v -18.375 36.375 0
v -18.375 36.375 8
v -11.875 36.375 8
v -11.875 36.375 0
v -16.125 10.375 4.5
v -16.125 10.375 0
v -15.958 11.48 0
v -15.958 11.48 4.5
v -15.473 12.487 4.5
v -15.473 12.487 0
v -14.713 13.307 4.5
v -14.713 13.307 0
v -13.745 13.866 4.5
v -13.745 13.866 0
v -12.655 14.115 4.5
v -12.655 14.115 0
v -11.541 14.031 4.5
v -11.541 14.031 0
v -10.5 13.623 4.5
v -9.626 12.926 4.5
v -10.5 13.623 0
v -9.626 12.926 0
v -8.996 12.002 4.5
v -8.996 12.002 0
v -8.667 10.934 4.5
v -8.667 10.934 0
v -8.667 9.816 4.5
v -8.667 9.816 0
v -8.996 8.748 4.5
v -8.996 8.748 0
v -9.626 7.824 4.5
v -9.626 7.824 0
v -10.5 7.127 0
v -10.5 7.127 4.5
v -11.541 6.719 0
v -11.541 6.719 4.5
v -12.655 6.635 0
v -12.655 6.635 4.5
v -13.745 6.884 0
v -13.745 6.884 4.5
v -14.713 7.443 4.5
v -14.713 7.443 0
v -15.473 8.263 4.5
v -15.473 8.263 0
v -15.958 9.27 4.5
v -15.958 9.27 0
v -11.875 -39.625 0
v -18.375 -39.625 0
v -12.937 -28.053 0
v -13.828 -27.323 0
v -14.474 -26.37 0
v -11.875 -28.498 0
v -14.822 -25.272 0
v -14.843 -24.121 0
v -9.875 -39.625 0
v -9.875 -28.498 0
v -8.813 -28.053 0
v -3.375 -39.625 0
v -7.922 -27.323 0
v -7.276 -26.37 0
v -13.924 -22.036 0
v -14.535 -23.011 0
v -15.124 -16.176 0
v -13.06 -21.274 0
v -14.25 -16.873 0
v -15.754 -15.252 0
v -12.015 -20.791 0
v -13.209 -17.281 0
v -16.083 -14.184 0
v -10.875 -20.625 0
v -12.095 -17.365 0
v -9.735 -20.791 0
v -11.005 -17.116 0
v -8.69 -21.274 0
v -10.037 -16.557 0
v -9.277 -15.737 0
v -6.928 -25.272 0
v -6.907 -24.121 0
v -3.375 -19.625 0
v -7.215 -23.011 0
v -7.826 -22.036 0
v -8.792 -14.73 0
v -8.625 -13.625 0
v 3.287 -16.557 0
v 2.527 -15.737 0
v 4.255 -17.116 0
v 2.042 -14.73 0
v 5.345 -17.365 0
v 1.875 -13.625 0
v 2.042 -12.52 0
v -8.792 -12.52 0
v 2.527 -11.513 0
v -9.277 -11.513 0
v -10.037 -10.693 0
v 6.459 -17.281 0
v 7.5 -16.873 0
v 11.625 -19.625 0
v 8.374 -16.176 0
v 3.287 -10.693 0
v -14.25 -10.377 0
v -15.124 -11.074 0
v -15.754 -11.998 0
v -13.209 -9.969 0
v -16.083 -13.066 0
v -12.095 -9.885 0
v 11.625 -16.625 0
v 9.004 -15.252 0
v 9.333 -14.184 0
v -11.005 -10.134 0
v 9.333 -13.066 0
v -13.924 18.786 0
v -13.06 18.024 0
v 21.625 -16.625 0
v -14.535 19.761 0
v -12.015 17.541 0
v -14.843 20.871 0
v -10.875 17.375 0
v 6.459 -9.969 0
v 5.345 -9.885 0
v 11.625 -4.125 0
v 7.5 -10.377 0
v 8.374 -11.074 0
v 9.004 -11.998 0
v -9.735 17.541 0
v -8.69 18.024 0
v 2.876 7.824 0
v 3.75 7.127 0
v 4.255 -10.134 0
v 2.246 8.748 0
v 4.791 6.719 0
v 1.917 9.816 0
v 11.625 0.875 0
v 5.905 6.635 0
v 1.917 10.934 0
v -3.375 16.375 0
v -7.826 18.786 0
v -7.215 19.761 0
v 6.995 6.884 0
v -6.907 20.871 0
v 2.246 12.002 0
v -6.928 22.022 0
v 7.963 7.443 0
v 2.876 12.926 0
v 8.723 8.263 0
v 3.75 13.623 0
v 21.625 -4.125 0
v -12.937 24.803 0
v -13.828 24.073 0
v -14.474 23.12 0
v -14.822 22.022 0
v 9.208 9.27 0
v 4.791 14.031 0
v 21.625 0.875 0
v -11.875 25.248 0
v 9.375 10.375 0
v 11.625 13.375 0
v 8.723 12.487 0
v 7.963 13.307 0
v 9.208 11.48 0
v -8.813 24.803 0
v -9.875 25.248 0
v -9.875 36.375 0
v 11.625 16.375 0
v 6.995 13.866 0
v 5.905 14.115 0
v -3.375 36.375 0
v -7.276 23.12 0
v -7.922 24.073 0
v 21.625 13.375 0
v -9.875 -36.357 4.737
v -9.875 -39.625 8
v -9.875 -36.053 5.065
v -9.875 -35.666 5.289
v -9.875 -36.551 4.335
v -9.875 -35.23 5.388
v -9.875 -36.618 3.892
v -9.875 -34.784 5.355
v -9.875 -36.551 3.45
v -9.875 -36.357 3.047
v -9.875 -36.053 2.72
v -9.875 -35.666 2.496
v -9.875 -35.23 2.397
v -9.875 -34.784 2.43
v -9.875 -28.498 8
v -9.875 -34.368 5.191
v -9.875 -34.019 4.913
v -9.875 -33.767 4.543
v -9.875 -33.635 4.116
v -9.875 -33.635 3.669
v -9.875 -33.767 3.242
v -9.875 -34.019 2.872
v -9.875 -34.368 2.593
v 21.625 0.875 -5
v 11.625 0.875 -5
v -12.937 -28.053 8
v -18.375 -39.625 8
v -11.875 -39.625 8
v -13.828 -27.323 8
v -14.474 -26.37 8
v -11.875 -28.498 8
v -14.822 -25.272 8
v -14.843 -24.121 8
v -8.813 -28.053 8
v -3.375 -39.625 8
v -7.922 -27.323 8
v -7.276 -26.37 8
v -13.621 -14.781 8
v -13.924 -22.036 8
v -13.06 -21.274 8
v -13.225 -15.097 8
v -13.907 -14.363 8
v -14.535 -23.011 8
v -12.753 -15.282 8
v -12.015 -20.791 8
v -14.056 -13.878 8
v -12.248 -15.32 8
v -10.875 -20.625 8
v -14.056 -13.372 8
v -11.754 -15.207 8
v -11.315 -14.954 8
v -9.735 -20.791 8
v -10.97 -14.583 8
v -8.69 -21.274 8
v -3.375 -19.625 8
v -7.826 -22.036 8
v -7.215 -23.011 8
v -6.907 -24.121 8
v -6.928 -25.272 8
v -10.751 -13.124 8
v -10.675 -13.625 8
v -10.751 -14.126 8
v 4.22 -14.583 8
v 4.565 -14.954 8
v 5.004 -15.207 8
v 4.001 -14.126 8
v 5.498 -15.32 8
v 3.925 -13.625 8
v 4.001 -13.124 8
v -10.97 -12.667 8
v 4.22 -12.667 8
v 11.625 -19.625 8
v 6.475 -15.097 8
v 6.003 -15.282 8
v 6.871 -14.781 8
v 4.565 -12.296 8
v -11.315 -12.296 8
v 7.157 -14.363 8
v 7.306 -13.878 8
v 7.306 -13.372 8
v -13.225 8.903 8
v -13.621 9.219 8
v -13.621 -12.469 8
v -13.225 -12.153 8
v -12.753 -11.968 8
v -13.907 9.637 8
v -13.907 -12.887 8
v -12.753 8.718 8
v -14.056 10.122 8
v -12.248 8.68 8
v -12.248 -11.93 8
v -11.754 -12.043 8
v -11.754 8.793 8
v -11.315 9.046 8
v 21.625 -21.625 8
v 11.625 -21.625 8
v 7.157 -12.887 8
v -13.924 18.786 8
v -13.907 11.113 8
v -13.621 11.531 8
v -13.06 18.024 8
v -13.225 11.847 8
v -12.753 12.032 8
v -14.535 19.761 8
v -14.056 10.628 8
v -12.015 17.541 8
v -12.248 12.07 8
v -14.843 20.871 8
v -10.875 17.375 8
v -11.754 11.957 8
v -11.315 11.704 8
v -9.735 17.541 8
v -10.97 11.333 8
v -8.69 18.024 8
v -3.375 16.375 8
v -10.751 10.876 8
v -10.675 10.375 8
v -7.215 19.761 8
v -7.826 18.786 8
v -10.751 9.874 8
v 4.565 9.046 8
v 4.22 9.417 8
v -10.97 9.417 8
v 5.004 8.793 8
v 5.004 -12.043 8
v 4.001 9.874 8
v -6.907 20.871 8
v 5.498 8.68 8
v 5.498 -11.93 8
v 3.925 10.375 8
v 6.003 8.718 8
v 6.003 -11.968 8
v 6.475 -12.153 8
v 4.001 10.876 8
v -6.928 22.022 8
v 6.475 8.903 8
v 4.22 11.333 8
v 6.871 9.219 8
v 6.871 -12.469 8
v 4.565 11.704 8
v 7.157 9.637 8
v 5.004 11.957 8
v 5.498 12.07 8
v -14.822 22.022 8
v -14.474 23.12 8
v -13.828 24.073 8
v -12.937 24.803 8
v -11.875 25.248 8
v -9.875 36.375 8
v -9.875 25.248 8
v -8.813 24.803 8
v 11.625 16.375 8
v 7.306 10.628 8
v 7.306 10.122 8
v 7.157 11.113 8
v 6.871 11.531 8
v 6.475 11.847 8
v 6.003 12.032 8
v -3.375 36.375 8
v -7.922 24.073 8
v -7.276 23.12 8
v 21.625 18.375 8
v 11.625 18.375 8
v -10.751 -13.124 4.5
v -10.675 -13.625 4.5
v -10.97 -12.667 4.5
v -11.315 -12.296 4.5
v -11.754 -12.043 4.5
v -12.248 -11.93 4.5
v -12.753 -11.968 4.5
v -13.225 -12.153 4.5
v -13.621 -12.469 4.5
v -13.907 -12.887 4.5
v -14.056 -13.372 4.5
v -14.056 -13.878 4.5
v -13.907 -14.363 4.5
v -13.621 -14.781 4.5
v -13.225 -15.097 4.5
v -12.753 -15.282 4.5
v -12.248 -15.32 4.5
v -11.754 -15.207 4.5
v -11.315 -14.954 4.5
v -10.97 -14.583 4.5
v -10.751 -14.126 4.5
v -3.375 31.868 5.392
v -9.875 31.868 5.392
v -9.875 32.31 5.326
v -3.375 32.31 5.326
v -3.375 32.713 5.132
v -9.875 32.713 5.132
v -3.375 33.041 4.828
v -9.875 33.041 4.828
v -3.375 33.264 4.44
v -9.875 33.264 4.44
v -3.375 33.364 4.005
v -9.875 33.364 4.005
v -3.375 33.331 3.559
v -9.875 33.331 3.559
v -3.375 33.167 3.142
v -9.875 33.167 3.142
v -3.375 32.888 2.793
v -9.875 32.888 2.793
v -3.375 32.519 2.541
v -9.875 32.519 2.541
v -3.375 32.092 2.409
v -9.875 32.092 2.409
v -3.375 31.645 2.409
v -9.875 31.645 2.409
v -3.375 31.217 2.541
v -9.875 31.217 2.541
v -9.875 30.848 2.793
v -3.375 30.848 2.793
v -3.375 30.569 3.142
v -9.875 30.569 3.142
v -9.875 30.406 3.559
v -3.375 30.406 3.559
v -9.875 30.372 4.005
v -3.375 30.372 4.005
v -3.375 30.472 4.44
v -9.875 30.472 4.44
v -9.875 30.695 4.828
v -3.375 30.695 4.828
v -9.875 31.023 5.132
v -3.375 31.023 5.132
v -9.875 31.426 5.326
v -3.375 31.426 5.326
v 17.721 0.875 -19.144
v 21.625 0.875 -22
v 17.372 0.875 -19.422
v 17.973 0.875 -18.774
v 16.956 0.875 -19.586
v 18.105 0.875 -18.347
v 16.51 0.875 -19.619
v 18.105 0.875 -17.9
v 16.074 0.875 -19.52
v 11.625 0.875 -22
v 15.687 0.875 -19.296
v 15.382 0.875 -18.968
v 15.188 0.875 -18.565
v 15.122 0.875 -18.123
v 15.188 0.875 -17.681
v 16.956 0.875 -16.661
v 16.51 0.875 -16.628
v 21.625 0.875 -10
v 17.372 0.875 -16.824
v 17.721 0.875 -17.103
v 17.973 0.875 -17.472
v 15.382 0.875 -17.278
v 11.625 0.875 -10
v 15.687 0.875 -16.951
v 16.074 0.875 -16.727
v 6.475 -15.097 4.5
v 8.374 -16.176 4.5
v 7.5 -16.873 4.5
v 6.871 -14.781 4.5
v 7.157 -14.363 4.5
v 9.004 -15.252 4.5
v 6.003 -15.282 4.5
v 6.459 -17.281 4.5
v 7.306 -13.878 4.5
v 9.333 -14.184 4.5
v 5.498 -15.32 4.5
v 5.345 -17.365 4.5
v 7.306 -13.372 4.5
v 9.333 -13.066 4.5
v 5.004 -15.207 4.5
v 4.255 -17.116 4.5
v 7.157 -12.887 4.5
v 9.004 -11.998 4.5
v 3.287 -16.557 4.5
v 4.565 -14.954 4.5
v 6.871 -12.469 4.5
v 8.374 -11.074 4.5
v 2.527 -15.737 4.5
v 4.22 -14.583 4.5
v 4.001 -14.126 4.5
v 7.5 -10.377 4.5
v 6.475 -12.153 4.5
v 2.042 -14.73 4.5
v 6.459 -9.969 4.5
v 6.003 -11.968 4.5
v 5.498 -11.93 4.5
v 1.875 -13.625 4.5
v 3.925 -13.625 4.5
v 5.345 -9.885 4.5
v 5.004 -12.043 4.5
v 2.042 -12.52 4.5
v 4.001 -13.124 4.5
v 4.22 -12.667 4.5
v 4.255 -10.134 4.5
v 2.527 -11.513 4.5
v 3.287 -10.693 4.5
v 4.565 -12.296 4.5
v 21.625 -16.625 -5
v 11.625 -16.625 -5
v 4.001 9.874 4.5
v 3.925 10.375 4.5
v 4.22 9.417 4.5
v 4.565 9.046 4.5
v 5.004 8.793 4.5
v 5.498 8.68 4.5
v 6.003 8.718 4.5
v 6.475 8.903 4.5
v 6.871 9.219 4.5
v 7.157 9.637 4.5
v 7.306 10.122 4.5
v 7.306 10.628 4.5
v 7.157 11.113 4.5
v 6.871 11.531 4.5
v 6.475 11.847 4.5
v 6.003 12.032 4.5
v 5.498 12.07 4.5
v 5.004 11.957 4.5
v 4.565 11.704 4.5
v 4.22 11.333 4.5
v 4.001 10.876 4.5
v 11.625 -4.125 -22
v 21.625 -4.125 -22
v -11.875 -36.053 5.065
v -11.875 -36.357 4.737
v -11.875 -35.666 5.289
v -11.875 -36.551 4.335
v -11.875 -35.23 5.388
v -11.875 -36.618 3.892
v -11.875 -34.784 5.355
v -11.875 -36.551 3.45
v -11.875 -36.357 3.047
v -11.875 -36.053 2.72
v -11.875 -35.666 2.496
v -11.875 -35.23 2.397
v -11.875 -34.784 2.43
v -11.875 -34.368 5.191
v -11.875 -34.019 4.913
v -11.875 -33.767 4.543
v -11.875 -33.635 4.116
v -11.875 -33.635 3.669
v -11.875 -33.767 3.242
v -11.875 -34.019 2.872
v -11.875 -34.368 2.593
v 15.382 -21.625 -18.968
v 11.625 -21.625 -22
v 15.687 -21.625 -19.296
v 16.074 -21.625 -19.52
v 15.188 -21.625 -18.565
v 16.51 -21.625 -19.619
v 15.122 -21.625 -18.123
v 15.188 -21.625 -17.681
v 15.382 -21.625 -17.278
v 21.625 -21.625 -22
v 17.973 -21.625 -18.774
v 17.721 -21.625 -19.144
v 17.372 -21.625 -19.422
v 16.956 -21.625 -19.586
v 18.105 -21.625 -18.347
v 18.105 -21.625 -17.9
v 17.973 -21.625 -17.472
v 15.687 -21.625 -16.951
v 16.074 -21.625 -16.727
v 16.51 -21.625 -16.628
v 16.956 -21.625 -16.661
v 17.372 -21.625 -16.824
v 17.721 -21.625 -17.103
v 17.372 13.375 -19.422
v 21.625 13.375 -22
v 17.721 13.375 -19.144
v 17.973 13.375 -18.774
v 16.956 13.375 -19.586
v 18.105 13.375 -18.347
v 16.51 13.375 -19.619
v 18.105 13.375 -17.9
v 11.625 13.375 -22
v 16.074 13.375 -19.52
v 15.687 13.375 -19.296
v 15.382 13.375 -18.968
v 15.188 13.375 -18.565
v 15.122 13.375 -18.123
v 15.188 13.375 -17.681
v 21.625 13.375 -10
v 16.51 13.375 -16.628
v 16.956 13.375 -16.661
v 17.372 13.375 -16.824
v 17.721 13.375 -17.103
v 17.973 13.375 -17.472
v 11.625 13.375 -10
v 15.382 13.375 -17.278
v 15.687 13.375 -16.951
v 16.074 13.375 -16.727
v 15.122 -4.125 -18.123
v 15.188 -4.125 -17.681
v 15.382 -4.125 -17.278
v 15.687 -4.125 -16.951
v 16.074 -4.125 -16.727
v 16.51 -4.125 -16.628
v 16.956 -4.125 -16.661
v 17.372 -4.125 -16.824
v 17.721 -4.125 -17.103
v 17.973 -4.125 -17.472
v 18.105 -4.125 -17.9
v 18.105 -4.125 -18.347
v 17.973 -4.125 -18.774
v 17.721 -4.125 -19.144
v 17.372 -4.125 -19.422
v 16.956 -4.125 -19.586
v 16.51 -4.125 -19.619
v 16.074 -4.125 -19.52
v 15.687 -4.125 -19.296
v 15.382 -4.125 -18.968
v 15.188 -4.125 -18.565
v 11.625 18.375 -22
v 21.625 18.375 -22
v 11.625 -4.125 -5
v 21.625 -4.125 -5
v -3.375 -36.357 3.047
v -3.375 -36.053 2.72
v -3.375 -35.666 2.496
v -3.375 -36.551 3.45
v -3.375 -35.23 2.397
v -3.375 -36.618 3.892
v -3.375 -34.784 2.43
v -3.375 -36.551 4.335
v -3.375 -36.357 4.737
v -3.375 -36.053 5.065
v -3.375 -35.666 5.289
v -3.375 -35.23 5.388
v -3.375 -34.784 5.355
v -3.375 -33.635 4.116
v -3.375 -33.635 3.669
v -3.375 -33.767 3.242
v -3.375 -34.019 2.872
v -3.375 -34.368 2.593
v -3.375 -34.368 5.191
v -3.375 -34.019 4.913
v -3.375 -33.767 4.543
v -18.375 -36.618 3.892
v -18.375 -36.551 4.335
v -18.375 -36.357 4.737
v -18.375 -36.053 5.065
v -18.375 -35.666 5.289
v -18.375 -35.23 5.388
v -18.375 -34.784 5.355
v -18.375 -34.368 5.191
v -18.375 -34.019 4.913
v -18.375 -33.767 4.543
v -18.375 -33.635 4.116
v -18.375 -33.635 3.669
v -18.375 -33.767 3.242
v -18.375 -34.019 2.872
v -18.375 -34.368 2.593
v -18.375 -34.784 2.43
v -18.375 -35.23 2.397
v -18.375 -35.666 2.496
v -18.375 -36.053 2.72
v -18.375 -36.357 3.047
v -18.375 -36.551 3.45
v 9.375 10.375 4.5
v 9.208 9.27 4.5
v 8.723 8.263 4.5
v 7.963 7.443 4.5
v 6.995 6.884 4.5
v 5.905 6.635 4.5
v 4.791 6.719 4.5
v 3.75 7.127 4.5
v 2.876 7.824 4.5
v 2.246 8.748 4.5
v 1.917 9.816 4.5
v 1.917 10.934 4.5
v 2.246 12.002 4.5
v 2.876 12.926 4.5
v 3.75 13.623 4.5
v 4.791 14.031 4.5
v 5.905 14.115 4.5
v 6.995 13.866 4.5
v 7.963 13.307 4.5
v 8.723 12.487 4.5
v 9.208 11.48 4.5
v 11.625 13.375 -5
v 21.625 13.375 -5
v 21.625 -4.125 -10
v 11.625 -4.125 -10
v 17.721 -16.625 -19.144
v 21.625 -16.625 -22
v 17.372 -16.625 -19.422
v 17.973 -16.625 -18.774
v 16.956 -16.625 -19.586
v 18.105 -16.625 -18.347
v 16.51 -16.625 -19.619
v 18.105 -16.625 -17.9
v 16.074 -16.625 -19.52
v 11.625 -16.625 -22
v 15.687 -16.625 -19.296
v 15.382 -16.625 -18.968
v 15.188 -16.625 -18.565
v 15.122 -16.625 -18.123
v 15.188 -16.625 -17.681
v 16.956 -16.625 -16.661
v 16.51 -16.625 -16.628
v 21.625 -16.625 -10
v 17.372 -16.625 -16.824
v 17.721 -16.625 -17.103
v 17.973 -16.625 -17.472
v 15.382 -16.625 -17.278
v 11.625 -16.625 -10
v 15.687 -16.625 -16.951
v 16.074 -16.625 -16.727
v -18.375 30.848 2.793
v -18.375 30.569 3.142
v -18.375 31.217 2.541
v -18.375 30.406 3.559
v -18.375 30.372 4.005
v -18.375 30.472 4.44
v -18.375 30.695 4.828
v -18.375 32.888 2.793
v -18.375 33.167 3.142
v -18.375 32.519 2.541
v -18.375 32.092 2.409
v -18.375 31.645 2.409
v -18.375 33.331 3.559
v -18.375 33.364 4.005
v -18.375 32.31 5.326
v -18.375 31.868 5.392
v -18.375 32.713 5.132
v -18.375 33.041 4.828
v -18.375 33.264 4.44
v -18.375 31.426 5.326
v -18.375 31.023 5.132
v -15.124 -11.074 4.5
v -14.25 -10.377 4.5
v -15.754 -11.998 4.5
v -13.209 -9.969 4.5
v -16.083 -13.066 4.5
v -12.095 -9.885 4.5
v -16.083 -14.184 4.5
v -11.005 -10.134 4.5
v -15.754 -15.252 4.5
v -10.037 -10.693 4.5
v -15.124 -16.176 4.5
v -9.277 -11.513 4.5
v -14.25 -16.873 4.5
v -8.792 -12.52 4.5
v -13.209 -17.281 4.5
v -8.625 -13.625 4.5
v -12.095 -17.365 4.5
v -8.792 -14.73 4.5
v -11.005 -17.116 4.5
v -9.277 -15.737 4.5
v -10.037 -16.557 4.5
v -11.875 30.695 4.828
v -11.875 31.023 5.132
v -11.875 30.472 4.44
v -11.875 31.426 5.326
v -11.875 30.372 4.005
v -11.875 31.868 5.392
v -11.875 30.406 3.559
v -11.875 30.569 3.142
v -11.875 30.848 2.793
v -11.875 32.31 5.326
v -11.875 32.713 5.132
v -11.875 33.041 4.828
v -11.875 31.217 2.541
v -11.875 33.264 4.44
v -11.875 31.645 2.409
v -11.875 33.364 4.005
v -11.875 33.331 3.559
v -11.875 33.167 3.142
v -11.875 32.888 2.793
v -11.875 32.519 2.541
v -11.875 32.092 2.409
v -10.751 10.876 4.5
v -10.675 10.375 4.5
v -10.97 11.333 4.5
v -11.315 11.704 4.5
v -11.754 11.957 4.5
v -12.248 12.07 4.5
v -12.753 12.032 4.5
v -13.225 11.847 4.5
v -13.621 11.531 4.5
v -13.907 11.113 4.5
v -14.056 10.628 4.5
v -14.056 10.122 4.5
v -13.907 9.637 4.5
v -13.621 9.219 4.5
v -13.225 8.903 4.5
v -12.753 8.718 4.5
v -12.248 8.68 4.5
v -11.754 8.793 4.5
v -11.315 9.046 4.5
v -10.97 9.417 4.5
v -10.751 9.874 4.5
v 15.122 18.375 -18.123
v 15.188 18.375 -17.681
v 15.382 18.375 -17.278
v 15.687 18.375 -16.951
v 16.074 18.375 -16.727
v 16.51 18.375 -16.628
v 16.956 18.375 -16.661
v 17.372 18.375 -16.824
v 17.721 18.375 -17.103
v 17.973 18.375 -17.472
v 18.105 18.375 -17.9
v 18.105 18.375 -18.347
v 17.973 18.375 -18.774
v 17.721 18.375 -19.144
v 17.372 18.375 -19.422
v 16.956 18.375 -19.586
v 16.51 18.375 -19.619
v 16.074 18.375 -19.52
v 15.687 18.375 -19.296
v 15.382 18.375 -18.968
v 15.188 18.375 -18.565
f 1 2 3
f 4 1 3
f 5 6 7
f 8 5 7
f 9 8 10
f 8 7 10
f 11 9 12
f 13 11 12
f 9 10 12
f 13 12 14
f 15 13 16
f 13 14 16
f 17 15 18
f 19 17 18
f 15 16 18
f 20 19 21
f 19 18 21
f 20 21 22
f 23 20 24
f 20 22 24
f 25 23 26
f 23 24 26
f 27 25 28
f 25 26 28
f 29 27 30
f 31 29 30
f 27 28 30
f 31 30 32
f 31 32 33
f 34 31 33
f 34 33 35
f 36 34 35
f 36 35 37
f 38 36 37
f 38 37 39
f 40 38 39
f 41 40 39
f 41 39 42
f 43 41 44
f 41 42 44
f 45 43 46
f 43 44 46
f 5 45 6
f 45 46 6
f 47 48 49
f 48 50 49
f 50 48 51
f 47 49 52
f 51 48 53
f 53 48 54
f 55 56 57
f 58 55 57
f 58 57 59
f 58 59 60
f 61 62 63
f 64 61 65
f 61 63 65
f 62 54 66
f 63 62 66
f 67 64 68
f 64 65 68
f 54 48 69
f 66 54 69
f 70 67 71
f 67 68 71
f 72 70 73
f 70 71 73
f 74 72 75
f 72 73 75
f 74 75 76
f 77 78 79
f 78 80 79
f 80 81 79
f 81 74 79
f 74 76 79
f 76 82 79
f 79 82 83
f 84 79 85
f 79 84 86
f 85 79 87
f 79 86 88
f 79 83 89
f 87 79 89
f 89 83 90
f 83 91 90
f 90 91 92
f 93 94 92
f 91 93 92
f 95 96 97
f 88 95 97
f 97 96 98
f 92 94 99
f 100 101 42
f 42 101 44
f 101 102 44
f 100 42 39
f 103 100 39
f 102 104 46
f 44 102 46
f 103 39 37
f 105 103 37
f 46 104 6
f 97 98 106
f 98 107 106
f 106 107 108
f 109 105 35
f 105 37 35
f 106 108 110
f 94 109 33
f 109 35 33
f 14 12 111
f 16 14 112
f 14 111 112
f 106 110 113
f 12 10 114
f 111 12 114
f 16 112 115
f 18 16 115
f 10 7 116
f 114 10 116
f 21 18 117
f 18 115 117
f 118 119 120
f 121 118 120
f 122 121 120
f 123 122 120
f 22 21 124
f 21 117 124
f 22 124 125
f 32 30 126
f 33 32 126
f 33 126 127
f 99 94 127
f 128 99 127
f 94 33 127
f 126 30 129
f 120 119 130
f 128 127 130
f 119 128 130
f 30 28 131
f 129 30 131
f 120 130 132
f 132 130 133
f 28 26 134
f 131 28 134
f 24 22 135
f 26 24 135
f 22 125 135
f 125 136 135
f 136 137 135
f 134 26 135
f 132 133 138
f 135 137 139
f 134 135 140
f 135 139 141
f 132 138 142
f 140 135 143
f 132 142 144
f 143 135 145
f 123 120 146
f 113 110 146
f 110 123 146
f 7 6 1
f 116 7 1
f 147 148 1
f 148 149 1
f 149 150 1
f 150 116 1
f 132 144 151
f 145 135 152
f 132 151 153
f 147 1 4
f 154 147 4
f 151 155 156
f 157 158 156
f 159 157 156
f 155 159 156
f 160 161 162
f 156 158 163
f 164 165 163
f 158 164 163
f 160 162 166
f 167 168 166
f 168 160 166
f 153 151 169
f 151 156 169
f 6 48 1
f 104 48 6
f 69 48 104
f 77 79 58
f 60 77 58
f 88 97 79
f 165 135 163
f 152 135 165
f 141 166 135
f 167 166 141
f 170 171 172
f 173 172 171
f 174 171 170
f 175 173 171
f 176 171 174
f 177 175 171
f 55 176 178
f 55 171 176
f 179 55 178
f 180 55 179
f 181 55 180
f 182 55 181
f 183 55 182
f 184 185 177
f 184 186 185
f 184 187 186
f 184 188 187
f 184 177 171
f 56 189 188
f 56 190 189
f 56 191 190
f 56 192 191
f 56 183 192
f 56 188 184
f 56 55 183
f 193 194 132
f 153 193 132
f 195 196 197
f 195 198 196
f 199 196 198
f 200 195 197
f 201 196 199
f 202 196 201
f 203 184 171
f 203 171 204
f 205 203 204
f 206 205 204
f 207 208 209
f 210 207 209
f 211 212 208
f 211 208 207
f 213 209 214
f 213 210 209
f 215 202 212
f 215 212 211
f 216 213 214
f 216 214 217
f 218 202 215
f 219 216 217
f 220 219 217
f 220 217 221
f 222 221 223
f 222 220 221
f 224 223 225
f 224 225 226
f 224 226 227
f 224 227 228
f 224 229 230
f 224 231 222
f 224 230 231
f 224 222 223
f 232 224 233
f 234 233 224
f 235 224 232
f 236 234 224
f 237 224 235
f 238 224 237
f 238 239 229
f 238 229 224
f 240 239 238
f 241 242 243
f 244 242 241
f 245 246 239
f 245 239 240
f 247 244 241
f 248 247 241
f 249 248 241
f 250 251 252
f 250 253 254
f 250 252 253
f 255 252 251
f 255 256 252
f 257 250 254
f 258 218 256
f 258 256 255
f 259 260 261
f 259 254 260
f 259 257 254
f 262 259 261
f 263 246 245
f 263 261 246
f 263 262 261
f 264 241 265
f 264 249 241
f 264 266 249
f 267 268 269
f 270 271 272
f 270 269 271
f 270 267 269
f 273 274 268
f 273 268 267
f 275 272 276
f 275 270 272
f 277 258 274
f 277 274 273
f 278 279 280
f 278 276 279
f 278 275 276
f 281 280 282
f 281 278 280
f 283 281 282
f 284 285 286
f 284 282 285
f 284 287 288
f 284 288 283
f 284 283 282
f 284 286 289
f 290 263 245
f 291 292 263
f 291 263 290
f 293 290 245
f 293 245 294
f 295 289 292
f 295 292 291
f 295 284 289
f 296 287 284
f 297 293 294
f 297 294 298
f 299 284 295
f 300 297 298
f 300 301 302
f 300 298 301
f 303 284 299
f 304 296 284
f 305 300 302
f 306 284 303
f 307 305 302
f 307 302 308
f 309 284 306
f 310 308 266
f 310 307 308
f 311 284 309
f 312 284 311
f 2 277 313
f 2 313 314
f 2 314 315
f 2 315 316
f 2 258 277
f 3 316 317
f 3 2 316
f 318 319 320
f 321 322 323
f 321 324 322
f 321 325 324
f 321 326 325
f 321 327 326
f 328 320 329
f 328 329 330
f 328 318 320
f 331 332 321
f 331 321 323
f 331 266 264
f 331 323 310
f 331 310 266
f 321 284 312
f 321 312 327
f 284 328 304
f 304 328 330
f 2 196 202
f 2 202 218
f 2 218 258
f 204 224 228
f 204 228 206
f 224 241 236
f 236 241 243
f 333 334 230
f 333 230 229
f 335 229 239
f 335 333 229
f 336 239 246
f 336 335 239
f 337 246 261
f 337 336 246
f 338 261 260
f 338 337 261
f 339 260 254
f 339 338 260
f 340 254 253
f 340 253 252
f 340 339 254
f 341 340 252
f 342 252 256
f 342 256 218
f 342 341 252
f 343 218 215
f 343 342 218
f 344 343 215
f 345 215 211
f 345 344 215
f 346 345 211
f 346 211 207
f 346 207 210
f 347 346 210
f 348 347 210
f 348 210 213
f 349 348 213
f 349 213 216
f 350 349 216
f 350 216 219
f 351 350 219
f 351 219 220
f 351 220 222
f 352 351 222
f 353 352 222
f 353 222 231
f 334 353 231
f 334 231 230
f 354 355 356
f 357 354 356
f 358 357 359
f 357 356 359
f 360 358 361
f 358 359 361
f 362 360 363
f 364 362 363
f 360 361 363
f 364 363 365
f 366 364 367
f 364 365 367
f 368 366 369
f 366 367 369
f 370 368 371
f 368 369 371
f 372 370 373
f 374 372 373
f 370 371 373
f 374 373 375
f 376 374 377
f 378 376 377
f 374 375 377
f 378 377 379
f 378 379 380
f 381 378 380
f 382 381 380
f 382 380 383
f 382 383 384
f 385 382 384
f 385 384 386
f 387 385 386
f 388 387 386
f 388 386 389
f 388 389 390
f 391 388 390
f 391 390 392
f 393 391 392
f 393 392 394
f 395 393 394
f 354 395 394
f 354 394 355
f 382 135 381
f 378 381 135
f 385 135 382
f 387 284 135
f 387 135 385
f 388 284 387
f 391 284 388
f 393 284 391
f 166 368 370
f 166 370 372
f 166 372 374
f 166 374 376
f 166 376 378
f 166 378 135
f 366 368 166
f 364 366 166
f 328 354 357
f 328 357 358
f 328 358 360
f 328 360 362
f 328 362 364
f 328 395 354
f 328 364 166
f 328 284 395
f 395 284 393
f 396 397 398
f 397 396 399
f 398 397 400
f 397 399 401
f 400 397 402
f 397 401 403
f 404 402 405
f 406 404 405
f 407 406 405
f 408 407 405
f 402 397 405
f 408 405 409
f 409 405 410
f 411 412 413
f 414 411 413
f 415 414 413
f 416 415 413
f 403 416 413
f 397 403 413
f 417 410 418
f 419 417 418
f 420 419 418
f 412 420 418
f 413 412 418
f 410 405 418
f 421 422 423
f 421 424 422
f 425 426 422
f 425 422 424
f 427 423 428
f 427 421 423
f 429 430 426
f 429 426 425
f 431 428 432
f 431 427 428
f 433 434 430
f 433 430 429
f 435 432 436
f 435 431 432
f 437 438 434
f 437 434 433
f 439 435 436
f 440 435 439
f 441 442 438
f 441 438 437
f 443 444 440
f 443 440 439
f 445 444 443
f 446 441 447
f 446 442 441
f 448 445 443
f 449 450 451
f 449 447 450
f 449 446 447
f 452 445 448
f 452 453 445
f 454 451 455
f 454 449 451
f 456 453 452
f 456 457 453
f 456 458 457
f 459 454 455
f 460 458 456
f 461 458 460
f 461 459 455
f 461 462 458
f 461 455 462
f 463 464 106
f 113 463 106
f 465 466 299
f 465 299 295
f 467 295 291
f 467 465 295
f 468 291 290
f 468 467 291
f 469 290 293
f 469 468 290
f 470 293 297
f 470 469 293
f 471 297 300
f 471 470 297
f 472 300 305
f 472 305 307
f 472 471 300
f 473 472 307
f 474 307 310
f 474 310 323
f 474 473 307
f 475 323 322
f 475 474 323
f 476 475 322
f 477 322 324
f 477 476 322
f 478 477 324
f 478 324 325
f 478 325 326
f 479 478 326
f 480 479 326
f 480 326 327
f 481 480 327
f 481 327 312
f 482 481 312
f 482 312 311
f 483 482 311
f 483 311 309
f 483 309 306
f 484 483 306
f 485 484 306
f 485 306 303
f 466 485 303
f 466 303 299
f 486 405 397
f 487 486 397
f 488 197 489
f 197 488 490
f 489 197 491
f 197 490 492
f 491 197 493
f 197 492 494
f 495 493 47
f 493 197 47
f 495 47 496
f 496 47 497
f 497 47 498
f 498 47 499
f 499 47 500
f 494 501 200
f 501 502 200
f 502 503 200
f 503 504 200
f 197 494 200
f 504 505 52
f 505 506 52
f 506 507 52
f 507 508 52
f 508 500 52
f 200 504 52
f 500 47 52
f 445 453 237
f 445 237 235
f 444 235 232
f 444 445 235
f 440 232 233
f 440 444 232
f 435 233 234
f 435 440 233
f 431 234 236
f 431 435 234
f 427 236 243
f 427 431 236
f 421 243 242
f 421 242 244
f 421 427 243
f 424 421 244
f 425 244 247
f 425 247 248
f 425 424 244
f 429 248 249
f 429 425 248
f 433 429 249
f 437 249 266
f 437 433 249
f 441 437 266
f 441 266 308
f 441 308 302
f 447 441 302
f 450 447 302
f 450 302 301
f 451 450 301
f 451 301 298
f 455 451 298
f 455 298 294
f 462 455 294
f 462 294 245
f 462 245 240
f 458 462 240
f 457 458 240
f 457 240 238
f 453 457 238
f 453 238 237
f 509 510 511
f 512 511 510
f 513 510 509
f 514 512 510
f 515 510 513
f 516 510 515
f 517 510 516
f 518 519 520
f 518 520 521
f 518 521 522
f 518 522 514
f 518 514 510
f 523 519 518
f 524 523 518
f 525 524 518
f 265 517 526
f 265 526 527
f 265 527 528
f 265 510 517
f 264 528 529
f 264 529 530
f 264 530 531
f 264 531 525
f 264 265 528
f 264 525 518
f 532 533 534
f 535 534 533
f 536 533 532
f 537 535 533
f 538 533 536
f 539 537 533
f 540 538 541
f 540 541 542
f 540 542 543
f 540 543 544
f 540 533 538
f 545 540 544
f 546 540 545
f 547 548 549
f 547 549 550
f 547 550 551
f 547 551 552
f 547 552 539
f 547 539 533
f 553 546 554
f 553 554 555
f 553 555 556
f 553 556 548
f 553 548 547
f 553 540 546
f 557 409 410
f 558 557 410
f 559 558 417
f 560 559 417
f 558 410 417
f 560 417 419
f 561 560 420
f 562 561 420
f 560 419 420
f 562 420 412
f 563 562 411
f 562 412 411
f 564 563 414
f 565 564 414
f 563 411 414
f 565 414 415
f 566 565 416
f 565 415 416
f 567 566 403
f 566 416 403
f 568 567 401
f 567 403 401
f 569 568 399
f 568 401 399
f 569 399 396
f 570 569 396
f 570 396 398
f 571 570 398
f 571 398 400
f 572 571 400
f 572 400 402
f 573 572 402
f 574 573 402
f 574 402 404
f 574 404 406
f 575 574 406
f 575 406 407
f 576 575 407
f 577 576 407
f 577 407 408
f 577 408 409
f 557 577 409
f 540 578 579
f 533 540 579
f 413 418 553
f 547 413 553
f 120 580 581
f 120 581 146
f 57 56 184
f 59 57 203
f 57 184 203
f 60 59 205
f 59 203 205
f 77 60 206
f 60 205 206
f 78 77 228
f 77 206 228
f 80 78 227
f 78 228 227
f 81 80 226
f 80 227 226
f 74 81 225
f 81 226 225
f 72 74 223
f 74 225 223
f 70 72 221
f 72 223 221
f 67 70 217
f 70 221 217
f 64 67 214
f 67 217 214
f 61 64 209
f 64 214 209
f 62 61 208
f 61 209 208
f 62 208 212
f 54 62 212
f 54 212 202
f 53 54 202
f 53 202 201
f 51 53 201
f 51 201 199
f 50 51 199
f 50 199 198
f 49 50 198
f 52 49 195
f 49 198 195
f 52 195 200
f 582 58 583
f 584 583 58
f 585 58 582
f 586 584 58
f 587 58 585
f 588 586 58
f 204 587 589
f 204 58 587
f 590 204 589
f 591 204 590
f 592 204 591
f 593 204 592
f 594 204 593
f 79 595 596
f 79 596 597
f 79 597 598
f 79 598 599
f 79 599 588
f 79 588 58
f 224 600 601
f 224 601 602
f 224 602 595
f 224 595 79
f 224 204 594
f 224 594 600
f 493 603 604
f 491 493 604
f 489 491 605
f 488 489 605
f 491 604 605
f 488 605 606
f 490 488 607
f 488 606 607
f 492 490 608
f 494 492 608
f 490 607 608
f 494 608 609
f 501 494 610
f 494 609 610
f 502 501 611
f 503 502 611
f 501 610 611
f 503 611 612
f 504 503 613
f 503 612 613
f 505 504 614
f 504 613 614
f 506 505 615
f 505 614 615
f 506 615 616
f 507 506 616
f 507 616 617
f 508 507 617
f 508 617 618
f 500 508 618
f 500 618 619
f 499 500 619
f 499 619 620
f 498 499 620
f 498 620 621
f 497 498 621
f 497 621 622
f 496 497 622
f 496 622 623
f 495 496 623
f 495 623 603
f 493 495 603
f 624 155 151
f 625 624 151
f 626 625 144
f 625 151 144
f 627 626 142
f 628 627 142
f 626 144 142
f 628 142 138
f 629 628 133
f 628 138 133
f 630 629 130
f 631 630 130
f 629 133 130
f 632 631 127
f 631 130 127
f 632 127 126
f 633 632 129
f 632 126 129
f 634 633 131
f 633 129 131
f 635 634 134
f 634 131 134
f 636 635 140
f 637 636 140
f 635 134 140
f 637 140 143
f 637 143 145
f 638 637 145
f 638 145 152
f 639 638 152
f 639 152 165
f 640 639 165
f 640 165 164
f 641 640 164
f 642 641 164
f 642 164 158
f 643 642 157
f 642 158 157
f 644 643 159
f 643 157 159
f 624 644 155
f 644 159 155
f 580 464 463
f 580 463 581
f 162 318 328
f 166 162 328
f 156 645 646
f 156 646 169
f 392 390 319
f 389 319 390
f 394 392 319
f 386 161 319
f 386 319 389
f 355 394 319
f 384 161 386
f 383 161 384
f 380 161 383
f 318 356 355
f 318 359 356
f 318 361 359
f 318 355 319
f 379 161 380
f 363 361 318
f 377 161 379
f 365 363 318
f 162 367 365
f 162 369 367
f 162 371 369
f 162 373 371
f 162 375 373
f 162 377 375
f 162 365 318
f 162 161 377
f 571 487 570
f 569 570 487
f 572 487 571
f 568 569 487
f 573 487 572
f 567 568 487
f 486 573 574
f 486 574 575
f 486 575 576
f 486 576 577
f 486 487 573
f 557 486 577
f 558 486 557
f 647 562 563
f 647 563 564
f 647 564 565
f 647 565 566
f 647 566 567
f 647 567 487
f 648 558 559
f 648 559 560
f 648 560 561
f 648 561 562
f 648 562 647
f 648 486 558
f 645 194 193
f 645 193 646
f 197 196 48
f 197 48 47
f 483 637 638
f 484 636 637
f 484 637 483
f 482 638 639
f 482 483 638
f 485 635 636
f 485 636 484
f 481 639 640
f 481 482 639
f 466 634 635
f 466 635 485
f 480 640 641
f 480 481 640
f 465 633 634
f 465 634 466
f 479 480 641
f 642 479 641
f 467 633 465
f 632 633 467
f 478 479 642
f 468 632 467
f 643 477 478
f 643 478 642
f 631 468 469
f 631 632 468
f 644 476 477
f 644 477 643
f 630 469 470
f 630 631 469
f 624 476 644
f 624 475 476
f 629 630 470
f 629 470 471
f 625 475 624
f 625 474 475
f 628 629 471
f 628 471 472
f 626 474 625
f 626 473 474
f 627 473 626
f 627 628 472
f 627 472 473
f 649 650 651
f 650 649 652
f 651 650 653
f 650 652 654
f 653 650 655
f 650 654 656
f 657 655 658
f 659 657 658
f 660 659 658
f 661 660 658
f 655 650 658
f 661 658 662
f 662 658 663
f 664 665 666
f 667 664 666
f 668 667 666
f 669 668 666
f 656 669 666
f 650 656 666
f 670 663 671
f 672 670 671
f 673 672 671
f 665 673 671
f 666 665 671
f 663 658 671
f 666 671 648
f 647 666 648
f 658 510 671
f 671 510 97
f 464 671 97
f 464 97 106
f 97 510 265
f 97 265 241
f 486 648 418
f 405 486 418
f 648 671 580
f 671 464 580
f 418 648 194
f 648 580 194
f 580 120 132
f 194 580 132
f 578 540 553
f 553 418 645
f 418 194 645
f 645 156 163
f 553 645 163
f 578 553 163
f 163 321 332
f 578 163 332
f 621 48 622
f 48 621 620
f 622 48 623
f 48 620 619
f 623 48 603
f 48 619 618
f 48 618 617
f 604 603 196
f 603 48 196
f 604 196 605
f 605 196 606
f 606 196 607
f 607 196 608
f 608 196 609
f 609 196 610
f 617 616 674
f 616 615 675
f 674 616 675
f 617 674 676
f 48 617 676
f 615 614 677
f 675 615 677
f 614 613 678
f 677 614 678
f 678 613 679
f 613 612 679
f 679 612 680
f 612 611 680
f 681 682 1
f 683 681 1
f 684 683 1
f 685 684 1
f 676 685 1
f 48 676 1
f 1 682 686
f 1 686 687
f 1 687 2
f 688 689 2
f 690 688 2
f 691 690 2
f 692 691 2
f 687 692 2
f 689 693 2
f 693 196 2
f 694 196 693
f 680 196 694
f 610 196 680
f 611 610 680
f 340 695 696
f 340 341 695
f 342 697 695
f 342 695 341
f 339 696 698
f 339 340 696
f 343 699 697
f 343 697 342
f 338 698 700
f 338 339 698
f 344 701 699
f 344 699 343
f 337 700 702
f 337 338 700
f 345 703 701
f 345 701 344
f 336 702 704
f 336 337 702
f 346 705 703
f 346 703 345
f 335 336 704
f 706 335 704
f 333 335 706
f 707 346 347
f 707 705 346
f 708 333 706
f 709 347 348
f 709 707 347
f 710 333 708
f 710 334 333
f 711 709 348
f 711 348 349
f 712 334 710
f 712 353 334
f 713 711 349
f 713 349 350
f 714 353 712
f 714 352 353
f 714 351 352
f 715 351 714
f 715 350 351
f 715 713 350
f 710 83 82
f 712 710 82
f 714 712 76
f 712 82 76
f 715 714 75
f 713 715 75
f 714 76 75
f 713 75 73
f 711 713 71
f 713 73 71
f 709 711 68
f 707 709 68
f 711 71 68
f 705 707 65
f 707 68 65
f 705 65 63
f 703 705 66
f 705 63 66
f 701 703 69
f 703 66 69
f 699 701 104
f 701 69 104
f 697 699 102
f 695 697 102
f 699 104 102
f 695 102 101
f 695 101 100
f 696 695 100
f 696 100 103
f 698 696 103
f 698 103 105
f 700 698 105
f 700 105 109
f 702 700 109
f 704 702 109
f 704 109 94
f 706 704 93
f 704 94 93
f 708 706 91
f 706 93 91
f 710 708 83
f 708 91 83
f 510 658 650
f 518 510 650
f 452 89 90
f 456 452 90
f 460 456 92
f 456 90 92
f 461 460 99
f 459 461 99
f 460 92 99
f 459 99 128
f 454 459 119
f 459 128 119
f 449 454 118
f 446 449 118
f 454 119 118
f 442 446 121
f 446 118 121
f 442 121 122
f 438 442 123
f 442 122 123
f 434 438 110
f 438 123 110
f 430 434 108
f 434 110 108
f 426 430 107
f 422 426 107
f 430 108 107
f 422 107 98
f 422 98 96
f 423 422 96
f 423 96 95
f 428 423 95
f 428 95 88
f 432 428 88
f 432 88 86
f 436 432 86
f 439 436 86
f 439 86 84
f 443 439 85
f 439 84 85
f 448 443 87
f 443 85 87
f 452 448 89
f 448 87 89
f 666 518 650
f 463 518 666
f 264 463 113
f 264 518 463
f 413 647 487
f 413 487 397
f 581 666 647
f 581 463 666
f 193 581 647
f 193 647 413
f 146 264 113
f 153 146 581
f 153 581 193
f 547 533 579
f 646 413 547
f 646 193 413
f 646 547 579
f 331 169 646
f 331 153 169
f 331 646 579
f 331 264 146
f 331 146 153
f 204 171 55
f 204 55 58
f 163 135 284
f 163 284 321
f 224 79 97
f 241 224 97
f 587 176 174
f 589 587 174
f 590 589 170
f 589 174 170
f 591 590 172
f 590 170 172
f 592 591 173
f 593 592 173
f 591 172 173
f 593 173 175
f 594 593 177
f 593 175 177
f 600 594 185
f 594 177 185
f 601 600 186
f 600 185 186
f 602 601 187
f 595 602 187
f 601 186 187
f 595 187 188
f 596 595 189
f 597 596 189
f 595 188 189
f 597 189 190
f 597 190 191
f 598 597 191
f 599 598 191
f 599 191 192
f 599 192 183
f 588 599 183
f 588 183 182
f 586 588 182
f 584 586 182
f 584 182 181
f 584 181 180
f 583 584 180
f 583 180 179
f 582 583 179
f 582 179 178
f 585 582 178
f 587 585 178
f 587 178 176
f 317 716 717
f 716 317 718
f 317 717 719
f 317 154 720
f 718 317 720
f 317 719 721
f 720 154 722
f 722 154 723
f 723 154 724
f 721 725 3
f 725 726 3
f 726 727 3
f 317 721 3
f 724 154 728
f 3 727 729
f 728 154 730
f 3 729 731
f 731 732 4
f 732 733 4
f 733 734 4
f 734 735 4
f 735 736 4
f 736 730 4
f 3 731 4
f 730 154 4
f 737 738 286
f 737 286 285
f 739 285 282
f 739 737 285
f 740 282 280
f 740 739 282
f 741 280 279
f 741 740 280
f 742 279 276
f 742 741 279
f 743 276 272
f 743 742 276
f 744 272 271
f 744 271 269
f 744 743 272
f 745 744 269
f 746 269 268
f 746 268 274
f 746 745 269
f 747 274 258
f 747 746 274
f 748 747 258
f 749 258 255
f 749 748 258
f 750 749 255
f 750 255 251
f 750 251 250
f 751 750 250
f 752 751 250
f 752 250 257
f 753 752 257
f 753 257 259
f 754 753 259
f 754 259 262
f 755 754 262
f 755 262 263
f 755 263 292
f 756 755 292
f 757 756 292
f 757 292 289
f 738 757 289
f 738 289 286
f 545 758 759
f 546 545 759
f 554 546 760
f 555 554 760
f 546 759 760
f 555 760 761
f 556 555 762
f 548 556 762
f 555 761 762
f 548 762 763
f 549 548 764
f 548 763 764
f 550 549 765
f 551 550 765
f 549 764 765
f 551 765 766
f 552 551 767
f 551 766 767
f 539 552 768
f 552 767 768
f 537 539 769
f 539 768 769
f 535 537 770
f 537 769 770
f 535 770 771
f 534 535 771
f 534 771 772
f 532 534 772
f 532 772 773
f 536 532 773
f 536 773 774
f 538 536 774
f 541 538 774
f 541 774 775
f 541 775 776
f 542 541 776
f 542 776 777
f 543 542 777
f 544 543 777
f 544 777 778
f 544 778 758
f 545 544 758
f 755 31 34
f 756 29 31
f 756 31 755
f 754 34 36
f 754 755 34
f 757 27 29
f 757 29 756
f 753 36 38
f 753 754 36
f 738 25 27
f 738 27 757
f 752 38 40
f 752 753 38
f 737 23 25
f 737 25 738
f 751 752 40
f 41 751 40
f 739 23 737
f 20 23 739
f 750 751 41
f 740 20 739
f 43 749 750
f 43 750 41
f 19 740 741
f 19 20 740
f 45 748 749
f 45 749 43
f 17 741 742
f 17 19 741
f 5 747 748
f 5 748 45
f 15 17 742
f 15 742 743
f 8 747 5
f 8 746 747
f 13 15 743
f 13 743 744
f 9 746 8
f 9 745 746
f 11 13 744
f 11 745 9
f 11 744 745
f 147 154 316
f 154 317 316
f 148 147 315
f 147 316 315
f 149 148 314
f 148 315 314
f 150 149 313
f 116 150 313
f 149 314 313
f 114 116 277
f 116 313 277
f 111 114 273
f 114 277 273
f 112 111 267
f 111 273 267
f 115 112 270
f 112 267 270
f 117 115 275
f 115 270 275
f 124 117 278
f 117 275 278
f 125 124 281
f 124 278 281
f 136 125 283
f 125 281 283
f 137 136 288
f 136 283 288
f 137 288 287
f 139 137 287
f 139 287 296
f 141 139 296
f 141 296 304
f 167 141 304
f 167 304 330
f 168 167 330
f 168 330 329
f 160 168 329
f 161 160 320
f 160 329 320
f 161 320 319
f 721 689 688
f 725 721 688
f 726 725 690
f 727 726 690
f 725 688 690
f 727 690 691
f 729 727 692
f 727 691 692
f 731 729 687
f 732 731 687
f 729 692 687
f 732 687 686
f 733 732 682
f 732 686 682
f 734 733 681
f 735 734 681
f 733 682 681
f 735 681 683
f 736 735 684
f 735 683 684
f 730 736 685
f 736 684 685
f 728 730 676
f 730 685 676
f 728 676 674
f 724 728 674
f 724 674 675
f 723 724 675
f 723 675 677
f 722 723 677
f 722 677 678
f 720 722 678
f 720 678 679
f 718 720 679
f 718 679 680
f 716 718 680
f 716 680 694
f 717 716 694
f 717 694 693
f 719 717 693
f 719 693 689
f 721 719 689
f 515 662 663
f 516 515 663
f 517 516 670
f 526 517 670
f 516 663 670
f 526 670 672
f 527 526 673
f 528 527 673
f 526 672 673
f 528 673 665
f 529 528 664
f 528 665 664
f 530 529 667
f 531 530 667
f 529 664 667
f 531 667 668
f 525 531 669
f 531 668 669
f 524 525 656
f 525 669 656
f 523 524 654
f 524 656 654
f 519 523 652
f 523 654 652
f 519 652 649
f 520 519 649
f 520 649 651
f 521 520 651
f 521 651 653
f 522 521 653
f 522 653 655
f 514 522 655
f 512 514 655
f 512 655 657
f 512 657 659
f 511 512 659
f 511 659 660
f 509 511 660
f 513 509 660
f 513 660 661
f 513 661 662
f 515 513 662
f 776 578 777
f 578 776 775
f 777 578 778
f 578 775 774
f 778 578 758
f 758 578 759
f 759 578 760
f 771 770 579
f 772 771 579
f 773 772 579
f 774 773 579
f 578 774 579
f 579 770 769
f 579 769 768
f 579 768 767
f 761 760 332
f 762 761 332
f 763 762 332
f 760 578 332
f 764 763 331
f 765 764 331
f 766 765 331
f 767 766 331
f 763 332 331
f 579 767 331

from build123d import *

# Parameters (mm, degrees)
SKETCH_1_W          = 30
SKETCH_1_H          = 36
SKETCH_1_R          = 1.7
EXTRUDE_1_DEPTH     = 8
SKETCH_2_R          = 3.75
CUT_EXTRUDE_1_DEPTH = 4.5
SKETCH_3_W          = 15
SKETCH_3_H          = 20
SKETCH_3_R          = 4
EXTRUDE_4_DEPTH     = 8
SKETCH_8_W          = 10
SKETCH_8_H          = 40
EXTRUDE_5_DEPTH     = 30
SKETCH_10_W         = 12
SKETCH_10_H         = 12.5
SKETCH_10_W_2       = 5
CUT_EXTRUDE_4_DEPTH = 30
SKETCH_11_R         = 1.5
CUT_EXTRUDE_5_DEPTH = 47
SKETCH_12_W         = 2
SKETCH_12_H         = 25.842259392
SKETCH_12_H_2       = 30.756424204
CUT_EXTRUDE_6_DEPTH = 10
SKETCH_13_R         = 1.5
CUT_EXTRUDE_7_DEPTH = 40


with BuildPart() as part:
    # 草图1 → 凸台-拉伸1 (new body)
    with BuildSketch(Plane.XY):
        with Locations((-3.375, -1.625)):
            Rectangle(SKETCH_1_W, SKETCH_1_H)
        with Locations((-12.375, 10.375)):
            Circle(SKETCH_1_R, mode=Mode.SUBTRACT)
        with Locations((-12.375, -13.625)):
            Circle(SKETCH_1_R, mode=Mode.SUBTRACT)
        with Locations(Location((5.625, -13.625, 0), (0, 0, 180))):
            Circle(SKETCH_1_R, mode=Mode.SUBTRACT)
        with Locations(Location((5.625, 10.375, 0), (0, 0, 180))):
            Circle(SKETCH_1_R, mode=Mode.SUBTRACT)
    extrude(amount=EXTRUDE_1_DEPTH)

    # 草图2 → 切除-拉伸1 (cut)
    with BuildSketch(Plane(origin=(0, 0, 0), x_dir=(-1, 0, 0), z_dir=(0, 0, -1))):
        with Locations((12.375, 10.375)):
            Circle(SKETCH_2_R)
        with Locations(Location((-5.625, 10.375, 0), (0, 0, 180))):
            Circle(SKETCH_2_R)
        with Locations(Location((12.375, -13.625, 0), (0, 0, 180))):
            Circle(SKETCH_2_R)
        with Locations((-5.625, -13.625)):
            Circle(SKETCH_2_R)
    extrude(amount=-CUT_EXTRUDE_1_DEPTH, mode=Mode.SUBTRACT)

    # 草图3 → 凸台-拉伸4 (add)
    # profile 1 of 2: a face of its own
    with BuildSketch(Plane.XY.offset(8)):
        with Locations((-10.875, 26.375)):
            Rectangle(SKETCH_3_W, SKETCH_3_H)
        with Locations((-10.875, 21.375)):
            Circle(SKETCH_3_R, mode=Mode.SUBTRACT)
    # profile 2 of 2: a face of its own
    with BuildSketch(Plane.XY.offset(8)):
        with Locations((-10.875, -29.625)):
            Rectangle(SKETCH_3_W, SKETCH_3_H)
        with Locations((-10.875, -24.625)):
            Circle(SKETCH_3_R, mode=Mode.SUBTRACT)
    extrude(amount=-EXTRUDE_4_DEPTH)

    # 草图8 → 凸台-拉伸5 (add)
    with BuildSketch(Plane.XY.offset(8)):
        with Locations((16.625, -1.625)):
            Rectangle(SKETCH_8_W, SKETCH_8_H)
    extrude(amount=-EXTRUDE_5_DEPTH)

    # 草图10 → 切除-拉伸4 (cut)
    with BuildSketch(Plane.ZY.offset(-11.625)):
        with Locations((-16, 7.125)):
            Rectangle(SKETCH_10_W, SKETCH_10_H)
        with Locations((-2.5, 7.125)):
            Rectangle(SKETCH_10_W_2, SKETCH_10_H)
        with Locations((-2.5, -10.375)):
            Rectangle(SKETCH_10_W_2, SKETCH_10_H)
        with Locations((-16, -10.375)):
            Rectangle(SKETCH_10_W, SKETCH_10_H)
    extrude(amount=-CUT_EXTRUDE_4_DEPTH, mode=Mode.SUBTRACT)

    # 草图11 → 切除-拉伸5 (cut)
    with BuildSketch(Plane(origin=(0, 18.375, 0), x_dir=(1, 0, 0), z_dir=(0, 1, 0))):
        with Locations(Location((16.621809271, 18.123313308, 0), (0, 0, 180))):
            Circle(SKETCH_11_R)
    extrude(amount=-CUT_EXTRUDE_5_DEPTH, mode=Mode.SUBTRACT)

    # 草图12 → 切除-拉伸6 (cut)
    with BuildSketch(Plane(origin=(0, 0, 0), x_dir=(-1, 0, 0), z_dir=(0, 0, -1))):
        with Locations((10.875, 36.375)):
            Rectangle(SKETCH_12_W, SKETCH_12_H)
        with Locations((10.875, -39.625)):
            Rectangle(SKETCH_12_W, SKETCH_12_H_2)
    extrude(amount=-CUT_EXTRUDE_6_DEPTH, mode=Mode.SUBTRACT)

    # 草图13 → 切除-拉伸7 (cut)
    with BuildSketch(Plane.ZY.offset(18.375)):
        with Locations((3.892451488, 31.868119268)):
            Circle(SKETCH_13_R)
        with Locations(Location((3.892451488, -35.118119268, 0), (0, 0, 270))):
            Circle(SKETCH_13_R)
    extrude(amount=-CUT_EXTRUDE_7_DEPTH, mode=Mode.SUBTRACT)


solid = part.part
